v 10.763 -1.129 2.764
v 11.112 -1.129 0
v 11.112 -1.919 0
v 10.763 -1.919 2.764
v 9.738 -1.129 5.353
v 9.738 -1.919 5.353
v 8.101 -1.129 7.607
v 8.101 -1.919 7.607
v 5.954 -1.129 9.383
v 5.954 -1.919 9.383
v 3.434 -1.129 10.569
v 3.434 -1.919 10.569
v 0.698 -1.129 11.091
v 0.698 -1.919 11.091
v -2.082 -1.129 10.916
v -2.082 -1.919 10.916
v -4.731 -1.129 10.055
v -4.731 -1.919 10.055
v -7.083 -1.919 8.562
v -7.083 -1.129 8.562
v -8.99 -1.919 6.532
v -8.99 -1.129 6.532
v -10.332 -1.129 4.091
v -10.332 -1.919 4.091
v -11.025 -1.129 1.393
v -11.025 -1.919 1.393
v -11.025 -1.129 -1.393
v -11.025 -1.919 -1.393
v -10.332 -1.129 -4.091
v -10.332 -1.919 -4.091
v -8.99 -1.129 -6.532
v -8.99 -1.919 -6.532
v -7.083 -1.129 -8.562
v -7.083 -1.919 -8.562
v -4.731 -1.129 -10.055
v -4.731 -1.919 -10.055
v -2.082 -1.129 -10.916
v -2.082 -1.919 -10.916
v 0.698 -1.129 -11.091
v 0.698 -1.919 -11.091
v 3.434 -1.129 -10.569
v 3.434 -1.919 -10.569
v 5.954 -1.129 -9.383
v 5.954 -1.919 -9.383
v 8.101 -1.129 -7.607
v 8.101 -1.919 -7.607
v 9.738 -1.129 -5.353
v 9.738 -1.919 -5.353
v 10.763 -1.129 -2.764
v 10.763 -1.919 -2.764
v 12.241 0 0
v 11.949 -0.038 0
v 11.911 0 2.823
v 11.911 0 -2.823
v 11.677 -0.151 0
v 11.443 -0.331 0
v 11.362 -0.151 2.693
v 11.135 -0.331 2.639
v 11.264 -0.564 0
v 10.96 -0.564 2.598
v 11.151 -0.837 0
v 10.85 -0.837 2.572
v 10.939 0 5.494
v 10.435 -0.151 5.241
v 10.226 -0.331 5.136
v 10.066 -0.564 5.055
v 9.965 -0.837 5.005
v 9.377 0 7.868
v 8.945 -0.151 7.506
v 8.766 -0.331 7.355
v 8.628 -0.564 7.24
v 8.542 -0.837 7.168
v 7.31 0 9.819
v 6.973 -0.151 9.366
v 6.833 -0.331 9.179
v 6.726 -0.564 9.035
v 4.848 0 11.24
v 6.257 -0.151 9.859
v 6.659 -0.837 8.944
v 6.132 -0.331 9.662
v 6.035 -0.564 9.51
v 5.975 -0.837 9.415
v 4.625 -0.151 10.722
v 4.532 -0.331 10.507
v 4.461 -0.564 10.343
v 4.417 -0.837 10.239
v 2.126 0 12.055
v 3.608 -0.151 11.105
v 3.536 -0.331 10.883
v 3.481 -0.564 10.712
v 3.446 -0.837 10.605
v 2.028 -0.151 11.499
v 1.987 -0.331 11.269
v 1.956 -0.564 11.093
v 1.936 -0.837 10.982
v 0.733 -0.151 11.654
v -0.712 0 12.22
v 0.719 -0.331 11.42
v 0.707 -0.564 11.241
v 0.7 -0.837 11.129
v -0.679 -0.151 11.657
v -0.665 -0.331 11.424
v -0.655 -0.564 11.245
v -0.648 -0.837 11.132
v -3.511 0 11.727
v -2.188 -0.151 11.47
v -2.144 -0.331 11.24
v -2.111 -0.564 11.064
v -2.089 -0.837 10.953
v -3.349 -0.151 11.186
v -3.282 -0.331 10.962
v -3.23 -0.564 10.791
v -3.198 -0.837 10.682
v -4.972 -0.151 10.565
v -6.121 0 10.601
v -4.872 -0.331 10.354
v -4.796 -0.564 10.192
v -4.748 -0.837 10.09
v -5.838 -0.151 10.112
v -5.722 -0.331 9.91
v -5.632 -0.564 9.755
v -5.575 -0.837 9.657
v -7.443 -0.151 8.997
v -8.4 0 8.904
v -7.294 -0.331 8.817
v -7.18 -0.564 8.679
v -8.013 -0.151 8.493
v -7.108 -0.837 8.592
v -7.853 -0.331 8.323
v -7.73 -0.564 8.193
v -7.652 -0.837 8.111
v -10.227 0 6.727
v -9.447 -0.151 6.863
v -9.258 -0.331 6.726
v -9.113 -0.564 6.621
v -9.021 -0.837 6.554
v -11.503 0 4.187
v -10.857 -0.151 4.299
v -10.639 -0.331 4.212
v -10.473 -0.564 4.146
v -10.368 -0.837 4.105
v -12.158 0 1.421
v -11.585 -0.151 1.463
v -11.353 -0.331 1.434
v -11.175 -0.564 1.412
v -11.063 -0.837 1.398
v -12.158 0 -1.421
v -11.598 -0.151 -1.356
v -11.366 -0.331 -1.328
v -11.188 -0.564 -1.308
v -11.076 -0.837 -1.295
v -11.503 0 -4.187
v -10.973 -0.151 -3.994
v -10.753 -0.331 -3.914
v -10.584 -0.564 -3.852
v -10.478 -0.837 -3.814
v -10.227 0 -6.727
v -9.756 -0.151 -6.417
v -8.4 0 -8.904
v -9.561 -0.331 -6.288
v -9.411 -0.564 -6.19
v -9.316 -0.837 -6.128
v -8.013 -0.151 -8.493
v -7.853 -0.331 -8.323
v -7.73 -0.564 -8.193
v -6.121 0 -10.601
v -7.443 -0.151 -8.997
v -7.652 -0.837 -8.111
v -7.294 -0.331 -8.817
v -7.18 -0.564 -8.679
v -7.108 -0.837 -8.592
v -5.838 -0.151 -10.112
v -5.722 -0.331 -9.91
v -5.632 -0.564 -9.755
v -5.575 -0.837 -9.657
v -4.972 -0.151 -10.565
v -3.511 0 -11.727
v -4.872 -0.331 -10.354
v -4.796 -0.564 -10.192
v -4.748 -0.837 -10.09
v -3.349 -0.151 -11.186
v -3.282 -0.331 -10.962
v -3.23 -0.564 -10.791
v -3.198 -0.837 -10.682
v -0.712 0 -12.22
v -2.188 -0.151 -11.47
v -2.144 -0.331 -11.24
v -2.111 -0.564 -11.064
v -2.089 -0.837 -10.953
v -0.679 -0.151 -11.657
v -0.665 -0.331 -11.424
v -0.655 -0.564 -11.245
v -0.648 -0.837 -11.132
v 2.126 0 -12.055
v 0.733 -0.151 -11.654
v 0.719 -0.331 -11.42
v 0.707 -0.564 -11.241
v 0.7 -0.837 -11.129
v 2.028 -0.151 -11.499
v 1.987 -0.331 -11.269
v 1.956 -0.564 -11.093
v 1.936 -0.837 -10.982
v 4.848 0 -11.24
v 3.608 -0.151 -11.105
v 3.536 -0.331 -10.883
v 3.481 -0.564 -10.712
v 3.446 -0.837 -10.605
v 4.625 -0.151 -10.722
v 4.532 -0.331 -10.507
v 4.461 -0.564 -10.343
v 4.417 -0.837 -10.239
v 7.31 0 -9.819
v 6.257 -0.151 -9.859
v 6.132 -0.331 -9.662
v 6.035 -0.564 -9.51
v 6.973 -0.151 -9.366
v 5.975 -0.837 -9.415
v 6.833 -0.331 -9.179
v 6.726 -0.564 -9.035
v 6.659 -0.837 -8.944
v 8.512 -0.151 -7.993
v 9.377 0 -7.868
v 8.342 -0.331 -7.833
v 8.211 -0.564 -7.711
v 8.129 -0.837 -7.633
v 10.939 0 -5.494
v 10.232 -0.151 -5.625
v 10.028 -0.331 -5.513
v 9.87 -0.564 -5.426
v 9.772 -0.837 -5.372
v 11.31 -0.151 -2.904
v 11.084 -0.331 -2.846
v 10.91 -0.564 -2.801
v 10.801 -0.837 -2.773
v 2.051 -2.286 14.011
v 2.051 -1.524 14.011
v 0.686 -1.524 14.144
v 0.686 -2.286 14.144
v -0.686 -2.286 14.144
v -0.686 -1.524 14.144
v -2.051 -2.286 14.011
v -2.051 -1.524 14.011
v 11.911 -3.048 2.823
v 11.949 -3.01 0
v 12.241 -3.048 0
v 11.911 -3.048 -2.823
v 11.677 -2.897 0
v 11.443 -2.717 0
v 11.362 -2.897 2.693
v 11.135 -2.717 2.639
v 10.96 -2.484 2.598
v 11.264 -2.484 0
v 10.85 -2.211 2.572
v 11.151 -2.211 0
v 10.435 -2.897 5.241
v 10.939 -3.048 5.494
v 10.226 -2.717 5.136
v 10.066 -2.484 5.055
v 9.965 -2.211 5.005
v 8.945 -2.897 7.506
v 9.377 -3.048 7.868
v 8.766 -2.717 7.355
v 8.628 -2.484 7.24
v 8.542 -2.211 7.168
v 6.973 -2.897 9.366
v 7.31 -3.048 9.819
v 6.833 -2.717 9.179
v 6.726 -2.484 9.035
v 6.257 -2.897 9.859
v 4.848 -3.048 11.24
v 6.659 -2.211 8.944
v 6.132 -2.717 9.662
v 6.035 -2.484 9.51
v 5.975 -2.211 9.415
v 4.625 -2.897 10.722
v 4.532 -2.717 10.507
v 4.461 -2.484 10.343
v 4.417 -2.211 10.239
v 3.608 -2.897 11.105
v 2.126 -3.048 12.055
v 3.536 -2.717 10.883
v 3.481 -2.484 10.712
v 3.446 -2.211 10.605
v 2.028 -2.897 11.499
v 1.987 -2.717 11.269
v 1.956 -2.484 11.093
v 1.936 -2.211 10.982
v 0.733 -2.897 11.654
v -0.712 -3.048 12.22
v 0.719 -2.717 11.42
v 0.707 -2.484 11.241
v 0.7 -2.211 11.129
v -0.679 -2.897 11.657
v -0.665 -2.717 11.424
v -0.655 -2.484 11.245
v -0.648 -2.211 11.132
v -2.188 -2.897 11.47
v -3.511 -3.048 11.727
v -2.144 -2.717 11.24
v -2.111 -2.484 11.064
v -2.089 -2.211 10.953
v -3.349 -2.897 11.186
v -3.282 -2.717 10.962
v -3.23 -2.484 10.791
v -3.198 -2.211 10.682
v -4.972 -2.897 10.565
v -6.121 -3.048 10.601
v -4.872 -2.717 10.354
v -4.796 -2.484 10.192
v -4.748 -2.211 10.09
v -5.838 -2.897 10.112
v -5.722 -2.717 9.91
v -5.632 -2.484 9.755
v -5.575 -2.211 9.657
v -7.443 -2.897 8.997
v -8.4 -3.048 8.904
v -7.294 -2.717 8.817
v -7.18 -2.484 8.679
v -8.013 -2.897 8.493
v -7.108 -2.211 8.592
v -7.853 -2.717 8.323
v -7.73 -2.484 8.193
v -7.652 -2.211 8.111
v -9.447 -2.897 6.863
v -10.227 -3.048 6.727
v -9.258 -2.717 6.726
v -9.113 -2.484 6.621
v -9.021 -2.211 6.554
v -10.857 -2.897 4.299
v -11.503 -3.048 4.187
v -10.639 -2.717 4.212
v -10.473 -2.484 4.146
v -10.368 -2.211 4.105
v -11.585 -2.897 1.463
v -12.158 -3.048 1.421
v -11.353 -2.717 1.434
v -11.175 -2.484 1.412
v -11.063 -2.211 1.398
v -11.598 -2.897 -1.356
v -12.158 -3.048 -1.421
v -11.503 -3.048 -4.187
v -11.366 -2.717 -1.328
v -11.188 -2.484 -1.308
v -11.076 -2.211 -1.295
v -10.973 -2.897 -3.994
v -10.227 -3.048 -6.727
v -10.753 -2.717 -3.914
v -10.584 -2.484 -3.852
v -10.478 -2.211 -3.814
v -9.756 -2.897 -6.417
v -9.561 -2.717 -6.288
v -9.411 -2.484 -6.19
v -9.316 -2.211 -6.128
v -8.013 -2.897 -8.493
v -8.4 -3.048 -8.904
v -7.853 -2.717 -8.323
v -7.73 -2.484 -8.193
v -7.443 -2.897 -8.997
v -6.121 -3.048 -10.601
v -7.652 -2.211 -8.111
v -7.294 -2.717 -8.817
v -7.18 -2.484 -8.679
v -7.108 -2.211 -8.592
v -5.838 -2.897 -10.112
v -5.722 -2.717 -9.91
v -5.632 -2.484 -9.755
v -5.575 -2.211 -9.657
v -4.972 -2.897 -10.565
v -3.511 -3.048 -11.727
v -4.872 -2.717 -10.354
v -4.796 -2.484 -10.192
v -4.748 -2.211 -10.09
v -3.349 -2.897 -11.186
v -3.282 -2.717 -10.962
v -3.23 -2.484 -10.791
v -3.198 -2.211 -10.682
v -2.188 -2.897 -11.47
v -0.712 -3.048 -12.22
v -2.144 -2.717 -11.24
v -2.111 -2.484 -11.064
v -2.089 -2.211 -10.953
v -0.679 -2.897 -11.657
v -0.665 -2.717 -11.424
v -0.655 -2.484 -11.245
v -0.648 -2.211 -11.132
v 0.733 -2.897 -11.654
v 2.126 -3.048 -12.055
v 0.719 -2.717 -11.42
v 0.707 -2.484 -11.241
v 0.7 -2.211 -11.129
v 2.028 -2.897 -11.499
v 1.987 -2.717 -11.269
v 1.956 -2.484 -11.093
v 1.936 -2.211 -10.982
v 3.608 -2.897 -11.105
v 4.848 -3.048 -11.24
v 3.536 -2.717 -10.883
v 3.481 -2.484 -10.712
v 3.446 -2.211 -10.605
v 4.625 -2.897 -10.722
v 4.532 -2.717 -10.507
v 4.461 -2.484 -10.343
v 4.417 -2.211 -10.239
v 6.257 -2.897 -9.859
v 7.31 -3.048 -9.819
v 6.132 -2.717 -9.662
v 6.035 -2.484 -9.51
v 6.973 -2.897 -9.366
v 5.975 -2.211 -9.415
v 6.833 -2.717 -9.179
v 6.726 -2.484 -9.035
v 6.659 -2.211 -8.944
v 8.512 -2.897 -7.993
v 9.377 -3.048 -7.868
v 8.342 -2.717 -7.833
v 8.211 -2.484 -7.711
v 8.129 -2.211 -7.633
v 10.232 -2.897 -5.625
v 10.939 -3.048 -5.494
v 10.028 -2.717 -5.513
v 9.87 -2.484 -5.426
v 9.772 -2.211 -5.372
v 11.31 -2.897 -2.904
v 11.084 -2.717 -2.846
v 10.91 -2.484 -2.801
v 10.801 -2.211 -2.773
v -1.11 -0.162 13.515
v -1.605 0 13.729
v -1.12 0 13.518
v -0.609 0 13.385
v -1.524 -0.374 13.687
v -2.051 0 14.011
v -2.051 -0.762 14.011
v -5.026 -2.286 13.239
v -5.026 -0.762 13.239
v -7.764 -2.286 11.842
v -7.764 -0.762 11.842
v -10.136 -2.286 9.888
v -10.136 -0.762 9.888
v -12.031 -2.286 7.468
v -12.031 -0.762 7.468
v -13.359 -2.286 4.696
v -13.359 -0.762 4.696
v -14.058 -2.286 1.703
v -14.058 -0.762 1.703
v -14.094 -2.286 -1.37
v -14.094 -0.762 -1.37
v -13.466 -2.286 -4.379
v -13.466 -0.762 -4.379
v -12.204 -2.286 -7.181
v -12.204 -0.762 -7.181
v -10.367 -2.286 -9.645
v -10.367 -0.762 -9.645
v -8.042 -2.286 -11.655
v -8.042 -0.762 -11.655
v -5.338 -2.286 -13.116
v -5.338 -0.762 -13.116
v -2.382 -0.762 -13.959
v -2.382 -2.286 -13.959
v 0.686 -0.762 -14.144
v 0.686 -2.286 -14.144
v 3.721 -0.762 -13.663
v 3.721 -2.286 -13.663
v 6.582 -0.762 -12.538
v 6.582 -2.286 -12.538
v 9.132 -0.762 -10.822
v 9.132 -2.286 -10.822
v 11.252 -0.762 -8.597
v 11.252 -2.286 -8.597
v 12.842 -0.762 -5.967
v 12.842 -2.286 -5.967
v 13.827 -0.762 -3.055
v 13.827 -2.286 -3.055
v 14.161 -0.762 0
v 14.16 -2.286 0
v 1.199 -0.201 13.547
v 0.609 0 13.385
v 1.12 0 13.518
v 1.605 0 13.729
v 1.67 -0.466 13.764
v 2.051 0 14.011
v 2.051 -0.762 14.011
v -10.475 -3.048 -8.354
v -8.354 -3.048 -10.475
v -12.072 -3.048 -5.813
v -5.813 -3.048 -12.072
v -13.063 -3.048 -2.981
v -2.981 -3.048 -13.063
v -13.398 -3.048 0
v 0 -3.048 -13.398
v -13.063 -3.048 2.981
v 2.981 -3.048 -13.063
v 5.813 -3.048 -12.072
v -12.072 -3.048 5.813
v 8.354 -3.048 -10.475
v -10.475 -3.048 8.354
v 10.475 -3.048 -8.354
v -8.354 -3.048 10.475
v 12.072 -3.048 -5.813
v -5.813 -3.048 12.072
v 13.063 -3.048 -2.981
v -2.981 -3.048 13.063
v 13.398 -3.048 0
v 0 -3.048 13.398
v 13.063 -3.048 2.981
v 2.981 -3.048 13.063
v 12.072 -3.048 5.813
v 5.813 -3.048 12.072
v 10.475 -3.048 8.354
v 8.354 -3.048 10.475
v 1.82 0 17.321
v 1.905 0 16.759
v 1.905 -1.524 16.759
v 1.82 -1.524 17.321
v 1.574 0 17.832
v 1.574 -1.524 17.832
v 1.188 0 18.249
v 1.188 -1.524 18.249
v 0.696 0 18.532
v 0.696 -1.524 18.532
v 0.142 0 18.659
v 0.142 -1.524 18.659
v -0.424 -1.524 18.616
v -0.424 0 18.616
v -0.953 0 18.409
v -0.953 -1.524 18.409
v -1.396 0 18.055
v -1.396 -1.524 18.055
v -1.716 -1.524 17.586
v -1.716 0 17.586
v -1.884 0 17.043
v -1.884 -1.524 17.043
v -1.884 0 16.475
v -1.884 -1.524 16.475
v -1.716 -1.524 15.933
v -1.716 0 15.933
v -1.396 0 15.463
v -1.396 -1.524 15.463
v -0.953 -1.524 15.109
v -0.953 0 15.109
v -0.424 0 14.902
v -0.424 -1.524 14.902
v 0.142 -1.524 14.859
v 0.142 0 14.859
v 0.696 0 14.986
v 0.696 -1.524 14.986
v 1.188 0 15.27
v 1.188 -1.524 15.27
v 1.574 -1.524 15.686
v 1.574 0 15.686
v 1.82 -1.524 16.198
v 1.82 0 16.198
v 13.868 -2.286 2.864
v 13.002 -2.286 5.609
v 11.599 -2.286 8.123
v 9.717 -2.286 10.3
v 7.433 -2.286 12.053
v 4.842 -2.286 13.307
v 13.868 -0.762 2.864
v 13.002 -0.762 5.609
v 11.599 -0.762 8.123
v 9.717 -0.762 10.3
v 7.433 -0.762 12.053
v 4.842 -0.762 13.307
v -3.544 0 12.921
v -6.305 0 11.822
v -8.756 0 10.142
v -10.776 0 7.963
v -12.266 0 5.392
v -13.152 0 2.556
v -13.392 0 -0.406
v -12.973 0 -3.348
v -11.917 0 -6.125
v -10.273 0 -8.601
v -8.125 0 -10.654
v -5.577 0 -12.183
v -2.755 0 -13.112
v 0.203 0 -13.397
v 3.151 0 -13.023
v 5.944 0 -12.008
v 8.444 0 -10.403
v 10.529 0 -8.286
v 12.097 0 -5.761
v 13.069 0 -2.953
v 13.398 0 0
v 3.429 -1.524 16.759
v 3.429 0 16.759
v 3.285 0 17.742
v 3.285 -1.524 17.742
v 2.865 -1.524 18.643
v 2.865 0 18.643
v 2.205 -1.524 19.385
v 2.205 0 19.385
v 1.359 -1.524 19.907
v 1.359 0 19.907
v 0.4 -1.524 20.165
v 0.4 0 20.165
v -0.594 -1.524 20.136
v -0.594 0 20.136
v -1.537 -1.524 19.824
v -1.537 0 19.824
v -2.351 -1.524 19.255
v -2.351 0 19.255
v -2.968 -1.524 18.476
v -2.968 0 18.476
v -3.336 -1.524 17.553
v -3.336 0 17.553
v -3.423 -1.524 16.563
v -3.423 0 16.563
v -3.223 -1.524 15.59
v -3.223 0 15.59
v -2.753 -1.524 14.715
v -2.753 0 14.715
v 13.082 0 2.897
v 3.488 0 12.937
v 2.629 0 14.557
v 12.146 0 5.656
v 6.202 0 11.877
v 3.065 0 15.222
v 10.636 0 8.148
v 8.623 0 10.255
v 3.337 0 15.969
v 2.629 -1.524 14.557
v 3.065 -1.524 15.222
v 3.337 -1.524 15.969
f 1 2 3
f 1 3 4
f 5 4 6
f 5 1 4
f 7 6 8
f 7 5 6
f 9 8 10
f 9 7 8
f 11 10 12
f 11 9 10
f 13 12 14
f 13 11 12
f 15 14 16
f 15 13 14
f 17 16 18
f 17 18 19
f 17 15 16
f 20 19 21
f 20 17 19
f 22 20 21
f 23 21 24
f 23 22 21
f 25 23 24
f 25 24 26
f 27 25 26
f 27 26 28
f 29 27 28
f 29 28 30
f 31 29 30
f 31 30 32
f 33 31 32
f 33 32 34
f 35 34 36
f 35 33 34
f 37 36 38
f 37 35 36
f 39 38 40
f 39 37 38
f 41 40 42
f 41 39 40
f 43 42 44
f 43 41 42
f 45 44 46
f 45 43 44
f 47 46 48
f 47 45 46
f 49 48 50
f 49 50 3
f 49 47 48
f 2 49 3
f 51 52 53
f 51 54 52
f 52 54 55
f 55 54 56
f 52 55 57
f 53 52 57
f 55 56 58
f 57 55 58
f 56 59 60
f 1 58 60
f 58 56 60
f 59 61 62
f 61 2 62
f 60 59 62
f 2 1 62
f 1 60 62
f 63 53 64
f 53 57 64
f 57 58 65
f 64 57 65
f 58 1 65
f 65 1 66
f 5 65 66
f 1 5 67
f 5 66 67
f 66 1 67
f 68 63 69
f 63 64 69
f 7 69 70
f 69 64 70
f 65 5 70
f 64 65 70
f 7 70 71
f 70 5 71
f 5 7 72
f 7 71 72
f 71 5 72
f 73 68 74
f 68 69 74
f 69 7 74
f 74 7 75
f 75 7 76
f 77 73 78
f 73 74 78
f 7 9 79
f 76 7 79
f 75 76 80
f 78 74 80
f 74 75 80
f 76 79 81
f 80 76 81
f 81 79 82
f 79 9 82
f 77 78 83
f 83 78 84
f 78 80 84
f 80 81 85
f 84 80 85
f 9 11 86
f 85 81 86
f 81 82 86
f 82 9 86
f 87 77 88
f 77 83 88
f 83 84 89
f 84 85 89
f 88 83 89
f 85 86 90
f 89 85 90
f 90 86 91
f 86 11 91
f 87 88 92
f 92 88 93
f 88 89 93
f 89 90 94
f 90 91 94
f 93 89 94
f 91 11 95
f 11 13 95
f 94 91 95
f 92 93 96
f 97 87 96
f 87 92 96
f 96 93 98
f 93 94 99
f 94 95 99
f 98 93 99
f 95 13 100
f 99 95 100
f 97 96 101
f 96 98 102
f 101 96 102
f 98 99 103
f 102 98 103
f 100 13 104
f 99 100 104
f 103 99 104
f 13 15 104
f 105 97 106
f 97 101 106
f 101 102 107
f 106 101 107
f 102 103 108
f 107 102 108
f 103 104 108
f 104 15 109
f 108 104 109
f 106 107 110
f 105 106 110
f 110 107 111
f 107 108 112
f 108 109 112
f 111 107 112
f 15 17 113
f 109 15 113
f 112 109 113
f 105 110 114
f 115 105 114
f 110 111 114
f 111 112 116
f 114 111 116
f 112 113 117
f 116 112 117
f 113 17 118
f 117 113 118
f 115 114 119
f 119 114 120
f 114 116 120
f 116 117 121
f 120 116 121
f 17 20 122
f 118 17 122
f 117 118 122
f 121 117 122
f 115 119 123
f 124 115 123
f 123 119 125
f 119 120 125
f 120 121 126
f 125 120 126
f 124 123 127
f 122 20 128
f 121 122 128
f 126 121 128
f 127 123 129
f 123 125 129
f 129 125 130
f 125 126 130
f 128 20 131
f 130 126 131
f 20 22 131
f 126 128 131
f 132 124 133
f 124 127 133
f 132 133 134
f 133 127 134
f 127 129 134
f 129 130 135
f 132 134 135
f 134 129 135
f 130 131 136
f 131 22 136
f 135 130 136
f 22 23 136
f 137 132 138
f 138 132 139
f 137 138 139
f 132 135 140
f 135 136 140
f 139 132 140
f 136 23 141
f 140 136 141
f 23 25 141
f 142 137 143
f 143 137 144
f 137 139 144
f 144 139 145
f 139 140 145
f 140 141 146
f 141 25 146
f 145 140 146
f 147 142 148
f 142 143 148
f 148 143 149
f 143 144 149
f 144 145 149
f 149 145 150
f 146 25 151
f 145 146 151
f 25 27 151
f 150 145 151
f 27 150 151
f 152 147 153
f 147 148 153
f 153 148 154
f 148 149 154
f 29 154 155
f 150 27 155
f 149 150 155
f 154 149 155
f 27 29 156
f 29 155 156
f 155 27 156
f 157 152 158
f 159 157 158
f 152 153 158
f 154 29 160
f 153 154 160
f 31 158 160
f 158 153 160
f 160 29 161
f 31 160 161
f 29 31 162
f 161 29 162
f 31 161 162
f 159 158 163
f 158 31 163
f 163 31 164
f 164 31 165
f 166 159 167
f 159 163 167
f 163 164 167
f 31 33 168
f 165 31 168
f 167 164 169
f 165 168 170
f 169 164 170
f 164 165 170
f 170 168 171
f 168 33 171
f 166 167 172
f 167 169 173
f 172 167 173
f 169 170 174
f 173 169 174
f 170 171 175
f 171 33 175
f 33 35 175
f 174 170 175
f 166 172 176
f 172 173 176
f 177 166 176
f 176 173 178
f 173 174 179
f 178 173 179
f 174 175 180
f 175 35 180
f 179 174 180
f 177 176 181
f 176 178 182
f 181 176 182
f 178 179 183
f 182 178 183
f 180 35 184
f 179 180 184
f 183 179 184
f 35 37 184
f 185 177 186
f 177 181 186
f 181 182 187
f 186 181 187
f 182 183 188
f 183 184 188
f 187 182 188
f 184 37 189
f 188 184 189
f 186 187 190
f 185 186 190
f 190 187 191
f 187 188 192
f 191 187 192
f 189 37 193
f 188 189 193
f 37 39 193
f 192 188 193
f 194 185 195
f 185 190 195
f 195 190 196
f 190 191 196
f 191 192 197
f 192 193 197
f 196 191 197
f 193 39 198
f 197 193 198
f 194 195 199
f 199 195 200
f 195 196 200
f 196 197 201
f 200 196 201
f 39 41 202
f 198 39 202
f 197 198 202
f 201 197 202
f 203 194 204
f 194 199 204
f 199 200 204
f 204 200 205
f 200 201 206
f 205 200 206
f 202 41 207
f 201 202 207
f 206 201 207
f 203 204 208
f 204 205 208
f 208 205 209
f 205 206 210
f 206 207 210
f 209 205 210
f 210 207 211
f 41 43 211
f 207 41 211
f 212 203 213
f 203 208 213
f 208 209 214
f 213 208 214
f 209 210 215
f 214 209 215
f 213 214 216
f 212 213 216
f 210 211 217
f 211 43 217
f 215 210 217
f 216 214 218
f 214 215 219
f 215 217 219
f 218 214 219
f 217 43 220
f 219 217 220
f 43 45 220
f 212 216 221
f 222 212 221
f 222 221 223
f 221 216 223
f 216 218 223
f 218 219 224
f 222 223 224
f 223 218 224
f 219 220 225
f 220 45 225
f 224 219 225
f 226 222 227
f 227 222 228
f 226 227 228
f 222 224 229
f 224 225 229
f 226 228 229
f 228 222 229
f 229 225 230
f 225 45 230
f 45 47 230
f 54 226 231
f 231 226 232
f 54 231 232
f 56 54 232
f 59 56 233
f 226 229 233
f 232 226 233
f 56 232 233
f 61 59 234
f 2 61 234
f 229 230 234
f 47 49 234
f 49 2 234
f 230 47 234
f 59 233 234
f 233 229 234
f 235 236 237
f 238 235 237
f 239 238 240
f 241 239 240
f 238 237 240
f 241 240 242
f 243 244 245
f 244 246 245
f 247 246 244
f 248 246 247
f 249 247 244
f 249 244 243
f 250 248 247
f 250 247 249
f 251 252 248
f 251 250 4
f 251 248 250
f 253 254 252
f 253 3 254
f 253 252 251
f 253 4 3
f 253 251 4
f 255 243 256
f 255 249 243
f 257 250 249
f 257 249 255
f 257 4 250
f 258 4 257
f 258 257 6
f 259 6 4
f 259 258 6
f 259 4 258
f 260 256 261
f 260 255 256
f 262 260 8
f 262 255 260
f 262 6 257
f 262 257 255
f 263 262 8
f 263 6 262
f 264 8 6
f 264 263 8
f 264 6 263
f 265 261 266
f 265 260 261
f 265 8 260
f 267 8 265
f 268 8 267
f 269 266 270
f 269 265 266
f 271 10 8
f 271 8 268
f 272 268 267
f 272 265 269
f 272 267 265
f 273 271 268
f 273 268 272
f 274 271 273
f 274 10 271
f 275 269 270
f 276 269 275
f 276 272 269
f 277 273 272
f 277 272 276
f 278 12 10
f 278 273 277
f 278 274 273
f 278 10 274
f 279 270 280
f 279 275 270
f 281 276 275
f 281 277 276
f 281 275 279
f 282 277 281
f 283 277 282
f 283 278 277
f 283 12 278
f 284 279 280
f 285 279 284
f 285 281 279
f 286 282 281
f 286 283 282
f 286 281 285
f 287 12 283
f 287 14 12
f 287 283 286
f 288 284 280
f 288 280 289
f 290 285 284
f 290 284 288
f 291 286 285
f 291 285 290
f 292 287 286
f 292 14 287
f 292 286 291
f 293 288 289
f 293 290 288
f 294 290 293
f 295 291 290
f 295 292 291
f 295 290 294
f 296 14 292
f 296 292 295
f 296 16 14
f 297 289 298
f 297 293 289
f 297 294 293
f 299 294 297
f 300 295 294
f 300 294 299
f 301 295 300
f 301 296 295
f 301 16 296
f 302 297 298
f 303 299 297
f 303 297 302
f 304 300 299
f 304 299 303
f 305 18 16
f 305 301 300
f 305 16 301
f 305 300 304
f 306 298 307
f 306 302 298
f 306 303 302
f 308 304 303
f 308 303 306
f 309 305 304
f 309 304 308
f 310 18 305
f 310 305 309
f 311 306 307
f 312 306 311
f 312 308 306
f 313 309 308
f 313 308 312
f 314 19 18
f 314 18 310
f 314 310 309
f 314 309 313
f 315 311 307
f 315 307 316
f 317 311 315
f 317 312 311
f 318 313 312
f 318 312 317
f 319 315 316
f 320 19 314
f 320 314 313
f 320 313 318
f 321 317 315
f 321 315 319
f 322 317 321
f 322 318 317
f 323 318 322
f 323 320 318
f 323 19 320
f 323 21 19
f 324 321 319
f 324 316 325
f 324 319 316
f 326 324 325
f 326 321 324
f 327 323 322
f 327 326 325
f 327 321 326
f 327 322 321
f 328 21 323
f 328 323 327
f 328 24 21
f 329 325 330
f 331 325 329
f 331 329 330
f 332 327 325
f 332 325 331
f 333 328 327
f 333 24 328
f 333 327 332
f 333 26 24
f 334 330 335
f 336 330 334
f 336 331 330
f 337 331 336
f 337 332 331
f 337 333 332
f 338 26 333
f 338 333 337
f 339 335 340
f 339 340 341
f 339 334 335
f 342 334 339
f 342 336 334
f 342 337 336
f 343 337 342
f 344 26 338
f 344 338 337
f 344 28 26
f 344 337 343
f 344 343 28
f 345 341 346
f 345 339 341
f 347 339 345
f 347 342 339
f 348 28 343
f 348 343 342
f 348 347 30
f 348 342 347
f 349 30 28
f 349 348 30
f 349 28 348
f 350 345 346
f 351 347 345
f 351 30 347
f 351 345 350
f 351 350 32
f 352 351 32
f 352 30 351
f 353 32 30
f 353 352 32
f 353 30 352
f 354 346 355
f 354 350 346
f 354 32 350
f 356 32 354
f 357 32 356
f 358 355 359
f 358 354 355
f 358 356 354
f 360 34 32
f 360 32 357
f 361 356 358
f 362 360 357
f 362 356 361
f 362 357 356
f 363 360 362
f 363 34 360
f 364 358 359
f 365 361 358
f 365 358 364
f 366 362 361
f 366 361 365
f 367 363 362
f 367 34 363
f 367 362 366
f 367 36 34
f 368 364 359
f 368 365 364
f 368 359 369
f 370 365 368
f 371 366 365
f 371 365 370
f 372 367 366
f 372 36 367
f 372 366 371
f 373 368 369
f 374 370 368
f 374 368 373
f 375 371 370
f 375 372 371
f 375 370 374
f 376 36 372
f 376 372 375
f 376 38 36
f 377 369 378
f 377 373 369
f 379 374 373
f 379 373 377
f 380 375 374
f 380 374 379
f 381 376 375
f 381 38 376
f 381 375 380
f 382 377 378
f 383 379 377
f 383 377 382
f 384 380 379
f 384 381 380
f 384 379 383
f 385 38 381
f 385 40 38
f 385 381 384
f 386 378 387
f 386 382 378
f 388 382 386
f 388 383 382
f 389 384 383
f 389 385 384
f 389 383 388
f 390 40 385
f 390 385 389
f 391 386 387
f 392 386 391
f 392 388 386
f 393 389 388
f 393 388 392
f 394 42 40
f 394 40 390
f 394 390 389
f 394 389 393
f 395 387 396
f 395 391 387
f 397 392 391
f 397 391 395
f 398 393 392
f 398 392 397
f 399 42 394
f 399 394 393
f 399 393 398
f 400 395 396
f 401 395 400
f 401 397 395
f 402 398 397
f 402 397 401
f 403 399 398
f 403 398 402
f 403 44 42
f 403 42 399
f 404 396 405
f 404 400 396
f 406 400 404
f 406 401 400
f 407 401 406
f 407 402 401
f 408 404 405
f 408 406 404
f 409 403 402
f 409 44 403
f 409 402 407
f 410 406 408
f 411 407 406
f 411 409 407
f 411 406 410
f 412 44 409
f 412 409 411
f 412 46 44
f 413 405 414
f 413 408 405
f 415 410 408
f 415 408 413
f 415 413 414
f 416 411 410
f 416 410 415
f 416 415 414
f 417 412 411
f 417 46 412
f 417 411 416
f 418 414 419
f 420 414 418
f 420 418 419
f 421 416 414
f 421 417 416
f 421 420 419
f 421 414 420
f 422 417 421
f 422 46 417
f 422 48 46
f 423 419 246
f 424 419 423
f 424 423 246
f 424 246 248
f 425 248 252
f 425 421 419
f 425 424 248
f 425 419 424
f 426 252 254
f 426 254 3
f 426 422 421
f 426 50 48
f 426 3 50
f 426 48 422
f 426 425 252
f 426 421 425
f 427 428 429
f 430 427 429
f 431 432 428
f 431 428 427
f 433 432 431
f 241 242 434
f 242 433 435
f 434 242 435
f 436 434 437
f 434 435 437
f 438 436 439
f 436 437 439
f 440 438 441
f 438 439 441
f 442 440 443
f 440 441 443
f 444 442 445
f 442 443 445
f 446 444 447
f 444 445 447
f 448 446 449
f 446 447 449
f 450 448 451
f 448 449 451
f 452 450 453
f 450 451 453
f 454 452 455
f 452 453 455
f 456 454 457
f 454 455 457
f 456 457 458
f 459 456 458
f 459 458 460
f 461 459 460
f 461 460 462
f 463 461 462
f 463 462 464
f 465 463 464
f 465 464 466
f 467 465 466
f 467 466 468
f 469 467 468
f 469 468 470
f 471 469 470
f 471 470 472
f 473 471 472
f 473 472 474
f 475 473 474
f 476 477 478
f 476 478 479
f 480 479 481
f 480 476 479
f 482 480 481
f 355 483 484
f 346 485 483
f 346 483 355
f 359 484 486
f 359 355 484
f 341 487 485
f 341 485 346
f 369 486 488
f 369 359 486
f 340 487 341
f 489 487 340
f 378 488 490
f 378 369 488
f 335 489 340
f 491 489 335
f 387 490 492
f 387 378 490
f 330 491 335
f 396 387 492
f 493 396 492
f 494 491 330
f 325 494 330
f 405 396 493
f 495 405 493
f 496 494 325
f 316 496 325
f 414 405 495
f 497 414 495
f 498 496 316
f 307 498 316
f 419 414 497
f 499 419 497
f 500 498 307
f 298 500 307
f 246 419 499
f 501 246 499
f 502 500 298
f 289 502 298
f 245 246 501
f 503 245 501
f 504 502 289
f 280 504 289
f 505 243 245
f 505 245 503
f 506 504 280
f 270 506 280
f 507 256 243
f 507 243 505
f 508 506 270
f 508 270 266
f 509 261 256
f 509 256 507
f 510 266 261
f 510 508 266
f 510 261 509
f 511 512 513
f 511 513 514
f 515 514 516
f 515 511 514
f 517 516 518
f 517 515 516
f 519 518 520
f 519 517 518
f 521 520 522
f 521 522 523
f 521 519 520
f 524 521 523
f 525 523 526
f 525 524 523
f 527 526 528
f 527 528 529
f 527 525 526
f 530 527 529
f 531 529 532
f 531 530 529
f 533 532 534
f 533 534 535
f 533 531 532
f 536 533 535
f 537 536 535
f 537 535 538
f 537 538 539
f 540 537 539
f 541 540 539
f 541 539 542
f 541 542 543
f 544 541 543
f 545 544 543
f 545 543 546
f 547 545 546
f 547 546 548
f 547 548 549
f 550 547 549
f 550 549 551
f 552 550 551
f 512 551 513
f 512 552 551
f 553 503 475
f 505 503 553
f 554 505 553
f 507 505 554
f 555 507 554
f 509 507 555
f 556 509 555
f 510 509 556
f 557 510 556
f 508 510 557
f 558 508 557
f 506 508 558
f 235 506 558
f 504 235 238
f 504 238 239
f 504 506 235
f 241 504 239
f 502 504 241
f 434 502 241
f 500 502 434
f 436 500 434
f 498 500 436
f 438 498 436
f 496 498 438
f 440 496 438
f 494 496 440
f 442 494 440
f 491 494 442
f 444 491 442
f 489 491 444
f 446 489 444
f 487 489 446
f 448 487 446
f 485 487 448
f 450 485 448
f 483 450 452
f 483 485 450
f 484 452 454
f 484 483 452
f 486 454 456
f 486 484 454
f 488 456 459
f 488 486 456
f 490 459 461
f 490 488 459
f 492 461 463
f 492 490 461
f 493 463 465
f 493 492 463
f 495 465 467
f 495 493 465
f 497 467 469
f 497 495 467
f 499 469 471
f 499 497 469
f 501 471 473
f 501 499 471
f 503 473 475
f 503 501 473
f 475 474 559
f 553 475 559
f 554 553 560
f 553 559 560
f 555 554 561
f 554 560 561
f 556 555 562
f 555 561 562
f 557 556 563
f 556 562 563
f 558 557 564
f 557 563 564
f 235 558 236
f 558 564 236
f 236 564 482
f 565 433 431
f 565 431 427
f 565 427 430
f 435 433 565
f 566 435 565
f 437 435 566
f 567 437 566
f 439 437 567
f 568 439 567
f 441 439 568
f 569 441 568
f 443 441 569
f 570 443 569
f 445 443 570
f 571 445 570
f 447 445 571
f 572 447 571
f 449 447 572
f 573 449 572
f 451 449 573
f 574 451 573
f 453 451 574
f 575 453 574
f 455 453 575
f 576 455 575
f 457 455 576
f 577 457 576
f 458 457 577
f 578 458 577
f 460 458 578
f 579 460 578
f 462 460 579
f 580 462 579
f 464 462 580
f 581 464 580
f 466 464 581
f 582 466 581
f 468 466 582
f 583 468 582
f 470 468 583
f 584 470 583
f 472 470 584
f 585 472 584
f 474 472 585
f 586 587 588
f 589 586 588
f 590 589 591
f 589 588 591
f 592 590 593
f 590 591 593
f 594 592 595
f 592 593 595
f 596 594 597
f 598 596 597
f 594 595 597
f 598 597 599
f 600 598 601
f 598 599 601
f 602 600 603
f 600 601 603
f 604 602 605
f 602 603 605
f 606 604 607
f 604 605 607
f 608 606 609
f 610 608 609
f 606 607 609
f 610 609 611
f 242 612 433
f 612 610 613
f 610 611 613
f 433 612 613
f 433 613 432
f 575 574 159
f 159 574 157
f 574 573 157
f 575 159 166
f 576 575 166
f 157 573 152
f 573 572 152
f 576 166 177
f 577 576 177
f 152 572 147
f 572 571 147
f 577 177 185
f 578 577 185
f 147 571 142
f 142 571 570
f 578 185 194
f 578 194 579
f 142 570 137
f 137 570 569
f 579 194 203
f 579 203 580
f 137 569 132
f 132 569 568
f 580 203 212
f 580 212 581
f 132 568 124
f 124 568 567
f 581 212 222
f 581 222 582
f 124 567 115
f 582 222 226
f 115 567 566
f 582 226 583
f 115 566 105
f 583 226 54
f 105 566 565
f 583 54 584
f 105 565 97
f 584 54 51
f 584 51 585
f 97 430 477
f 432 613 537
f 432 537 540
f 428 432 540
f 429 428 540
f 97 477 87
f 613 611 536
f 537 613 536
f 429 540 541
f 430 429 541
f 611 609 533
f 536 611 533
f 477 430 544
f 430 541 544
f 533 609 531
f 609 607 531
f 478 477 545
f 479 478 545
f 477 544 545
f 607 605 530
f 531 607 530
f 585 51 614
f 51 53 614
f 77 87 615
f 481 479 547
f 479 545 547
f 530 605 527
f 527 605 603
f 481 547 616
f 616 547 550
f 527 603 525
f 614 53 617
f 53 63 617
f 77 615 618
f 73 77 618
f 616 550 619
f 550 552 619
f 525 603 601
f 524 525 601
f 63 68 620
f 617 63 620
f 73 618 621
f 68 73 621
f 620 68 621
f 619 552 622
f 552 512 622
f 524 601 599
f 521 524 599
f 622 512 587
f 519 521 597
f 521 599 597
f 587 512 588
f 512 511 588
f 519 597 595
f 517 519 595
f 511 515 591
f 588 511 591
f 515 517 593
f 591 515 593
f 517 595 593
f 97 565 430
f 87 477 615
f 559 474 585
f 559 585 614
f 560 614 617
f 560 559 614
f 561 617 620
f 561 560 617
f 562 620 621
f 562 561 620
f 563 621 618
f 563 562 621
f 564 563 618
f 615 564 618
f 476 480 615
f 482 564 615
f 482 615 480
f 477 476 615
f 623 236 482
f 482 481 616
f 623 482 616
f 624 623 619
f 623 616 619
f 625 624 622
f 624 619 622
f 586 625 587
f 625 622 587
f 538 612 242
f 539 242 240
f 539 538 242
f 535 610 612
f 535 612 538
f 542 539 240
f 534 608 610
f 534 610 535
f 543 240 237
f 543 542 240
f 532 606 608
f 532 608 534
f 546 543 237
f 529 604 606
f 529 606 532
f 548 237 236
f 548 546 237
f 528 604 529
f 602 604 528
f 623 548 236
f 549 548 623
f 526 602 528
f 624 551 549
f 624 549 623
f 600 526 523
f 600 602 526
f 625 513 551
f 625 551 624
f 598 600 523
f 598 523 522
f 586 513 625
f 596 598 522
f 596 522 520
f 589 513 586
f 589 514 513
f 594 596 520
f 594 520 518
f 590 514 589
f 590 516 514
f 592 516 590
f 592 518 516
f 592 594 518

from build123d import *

# Parameters (mm, degrees)
F0_R         = 11.1125
F1_DEPTH     = 3.048
F0_R_2       = 1.905
F2_DEPTH     = 1.524
F3_R         = 1.1286206983
F4_T6_ANGLE  = 269.6278921261
F4_S7_R      = 3.429
F4_T8_DEPTH  = 22
F4_T12_ANGLE = 89.6035333551
F4_S13_R     = 3.429
F4_T14_DEPTH = 11


# Not quite as in the source:
# - a fillet or chamfer that OpenCascade refuses, or shapes differently, is made with other operations: its cross-section is extruded or revolved along the edge and cut away or added


with BuildPart() as f1:
    # F0 (on Front) → F1 (new body)
    with BuildSketch(Plane.XZ):
        with BuildLine():
            ThreePointArc((-2.05101646, 14.0111773856), (-9.2594908518, -10.713617009), (14.1605, 0))
            ThreePointArc((14.1605, 0), (10.713617009, 9.2594908518), (2.05101646, 14.0111773856))
            ThreePointArc((2.05101646, 14.0111773856), (0, 13.3301534555), (-2.05101646, 14.0111773856))
        make_face()
        Circle(F0_R, mode=Mode.SUBTRACT)
        with BuildLine():
            ThreePointArc((-2.05101646, 14.0111773856), (0, 13.3301534555), (2.05101646, 14.0111773856))
            ThreePointArc((2.05101646, 14.0111773856), (0, 14.1605), (-2.05101646, 14.0111773856))
        make_face()
    extrude(amount=F1_DEPTH)

    # F0 (on Front) → F2 (join)
    with BuildSketch(Plane.XZ):
        with BuildLine():
            ThreePointArc((-2.05101646, 14.0111773856), (0, 14.1605), (2.05101646, 14.0111773856))
            ThreePointArc((2.05101646, 14.0111773856), (3.065206065, 15.2220936716), (3.429, 16.7591534555))
            ThreePointArc((3.429, 16.7591534555), (-1.5370597839, 19.8243595205), (-2.05101646, 14.0111773856))
        make_face()
        with Locations((0, 16.7591534555)):
            Circle(F0_R_2, mode=Mode.SUBTRACT)
    extrude(amount=F2_DEPTH)

    # F3
    f3_edges = [f1.edges().sort_by_distance(p)[0] for p in [
        (11.1125, -1.524, 0),
        (-11.1125, 0, 0),
        (-11.1125, -3.048, 0),
    ]]
    fillet(f3_edges, radius=F3_R)

    # F4: chamfer of 0.762 on 2 edges, made by hand

    # F4_s1 → F4_t2 (revolve, cut)
    with BuildSketch(Plane.XY):
        Polygon((14.1605, -2.286), (13.3985, -3.048), (14.1605, -3.048), align=None)
    revolve(axis=Axis((0, -3.048, 0), (0, -1, 0)), mode=Mode.SUBTRACT)


with BuildPart() as f4_tool4:
    # F4_s5 → F4_t6 (revolve)
    with BuildSketch(Plane(origin=(0, 0, 0), x_dir=(0, 1, 0), z_dir=(0.9999789108, 0, 0.0064944619))):
        Polygon((0, 13.3985), (-0.762, 14.1605), (0, 14.1605), align=None)
    revolve(axis=Axis((0, 0, 0), (0, -1, 0)), revolution_arc=F4_T6_ANGLE)

    # F4_s7 → F4_t8 (cut, symmetric)
    with BuildSketch(Plane.XZ.offset(0.4)):
        with Locations((0, 16.7591534555)):
            Circle(F4_S7_R)
    extrude(amount=F4_T8_DEPTH, both=True, mode=Mode.SUBTRACT)


with BuildPart() as f1_1:
    add(f1.part)

    # F4_t3: cut F4_tool4
    add(f4_tool4.part, mode=Mode.SUBTRACT)


with BuildPart() as f4_tool10:
    # F4_s11 → F4_t12 (revolve)
    with BuildSketch(Plane.XY):
        Polygon((13.3985, 0), (14.1605, -0.762), (14.1605, 0), align=None)
    revolve(axis=Axis((0, 0, 0), (0, -1, 0)), revolution_arc=F4_T12_ANGLE)

    # F4_s13 → F4_t14 (cut, symmetric)
    with BuildSketch(Plane.XZ.offset(0.4)):
        with Locations((0, 16.7591534555)):
            Circle(F4_S13_R)
    extrude(amount=F4_T14_DEPTH, both=True, mode=Mode.SUBTRACT)


with BuildPart() as f1_2:
    add(f1_1.part)

    # F4_t9: cut F4_tool10
    add(f4_tool10.part, mode=Mode.SUBTRACT)


solid = f1_2.part
